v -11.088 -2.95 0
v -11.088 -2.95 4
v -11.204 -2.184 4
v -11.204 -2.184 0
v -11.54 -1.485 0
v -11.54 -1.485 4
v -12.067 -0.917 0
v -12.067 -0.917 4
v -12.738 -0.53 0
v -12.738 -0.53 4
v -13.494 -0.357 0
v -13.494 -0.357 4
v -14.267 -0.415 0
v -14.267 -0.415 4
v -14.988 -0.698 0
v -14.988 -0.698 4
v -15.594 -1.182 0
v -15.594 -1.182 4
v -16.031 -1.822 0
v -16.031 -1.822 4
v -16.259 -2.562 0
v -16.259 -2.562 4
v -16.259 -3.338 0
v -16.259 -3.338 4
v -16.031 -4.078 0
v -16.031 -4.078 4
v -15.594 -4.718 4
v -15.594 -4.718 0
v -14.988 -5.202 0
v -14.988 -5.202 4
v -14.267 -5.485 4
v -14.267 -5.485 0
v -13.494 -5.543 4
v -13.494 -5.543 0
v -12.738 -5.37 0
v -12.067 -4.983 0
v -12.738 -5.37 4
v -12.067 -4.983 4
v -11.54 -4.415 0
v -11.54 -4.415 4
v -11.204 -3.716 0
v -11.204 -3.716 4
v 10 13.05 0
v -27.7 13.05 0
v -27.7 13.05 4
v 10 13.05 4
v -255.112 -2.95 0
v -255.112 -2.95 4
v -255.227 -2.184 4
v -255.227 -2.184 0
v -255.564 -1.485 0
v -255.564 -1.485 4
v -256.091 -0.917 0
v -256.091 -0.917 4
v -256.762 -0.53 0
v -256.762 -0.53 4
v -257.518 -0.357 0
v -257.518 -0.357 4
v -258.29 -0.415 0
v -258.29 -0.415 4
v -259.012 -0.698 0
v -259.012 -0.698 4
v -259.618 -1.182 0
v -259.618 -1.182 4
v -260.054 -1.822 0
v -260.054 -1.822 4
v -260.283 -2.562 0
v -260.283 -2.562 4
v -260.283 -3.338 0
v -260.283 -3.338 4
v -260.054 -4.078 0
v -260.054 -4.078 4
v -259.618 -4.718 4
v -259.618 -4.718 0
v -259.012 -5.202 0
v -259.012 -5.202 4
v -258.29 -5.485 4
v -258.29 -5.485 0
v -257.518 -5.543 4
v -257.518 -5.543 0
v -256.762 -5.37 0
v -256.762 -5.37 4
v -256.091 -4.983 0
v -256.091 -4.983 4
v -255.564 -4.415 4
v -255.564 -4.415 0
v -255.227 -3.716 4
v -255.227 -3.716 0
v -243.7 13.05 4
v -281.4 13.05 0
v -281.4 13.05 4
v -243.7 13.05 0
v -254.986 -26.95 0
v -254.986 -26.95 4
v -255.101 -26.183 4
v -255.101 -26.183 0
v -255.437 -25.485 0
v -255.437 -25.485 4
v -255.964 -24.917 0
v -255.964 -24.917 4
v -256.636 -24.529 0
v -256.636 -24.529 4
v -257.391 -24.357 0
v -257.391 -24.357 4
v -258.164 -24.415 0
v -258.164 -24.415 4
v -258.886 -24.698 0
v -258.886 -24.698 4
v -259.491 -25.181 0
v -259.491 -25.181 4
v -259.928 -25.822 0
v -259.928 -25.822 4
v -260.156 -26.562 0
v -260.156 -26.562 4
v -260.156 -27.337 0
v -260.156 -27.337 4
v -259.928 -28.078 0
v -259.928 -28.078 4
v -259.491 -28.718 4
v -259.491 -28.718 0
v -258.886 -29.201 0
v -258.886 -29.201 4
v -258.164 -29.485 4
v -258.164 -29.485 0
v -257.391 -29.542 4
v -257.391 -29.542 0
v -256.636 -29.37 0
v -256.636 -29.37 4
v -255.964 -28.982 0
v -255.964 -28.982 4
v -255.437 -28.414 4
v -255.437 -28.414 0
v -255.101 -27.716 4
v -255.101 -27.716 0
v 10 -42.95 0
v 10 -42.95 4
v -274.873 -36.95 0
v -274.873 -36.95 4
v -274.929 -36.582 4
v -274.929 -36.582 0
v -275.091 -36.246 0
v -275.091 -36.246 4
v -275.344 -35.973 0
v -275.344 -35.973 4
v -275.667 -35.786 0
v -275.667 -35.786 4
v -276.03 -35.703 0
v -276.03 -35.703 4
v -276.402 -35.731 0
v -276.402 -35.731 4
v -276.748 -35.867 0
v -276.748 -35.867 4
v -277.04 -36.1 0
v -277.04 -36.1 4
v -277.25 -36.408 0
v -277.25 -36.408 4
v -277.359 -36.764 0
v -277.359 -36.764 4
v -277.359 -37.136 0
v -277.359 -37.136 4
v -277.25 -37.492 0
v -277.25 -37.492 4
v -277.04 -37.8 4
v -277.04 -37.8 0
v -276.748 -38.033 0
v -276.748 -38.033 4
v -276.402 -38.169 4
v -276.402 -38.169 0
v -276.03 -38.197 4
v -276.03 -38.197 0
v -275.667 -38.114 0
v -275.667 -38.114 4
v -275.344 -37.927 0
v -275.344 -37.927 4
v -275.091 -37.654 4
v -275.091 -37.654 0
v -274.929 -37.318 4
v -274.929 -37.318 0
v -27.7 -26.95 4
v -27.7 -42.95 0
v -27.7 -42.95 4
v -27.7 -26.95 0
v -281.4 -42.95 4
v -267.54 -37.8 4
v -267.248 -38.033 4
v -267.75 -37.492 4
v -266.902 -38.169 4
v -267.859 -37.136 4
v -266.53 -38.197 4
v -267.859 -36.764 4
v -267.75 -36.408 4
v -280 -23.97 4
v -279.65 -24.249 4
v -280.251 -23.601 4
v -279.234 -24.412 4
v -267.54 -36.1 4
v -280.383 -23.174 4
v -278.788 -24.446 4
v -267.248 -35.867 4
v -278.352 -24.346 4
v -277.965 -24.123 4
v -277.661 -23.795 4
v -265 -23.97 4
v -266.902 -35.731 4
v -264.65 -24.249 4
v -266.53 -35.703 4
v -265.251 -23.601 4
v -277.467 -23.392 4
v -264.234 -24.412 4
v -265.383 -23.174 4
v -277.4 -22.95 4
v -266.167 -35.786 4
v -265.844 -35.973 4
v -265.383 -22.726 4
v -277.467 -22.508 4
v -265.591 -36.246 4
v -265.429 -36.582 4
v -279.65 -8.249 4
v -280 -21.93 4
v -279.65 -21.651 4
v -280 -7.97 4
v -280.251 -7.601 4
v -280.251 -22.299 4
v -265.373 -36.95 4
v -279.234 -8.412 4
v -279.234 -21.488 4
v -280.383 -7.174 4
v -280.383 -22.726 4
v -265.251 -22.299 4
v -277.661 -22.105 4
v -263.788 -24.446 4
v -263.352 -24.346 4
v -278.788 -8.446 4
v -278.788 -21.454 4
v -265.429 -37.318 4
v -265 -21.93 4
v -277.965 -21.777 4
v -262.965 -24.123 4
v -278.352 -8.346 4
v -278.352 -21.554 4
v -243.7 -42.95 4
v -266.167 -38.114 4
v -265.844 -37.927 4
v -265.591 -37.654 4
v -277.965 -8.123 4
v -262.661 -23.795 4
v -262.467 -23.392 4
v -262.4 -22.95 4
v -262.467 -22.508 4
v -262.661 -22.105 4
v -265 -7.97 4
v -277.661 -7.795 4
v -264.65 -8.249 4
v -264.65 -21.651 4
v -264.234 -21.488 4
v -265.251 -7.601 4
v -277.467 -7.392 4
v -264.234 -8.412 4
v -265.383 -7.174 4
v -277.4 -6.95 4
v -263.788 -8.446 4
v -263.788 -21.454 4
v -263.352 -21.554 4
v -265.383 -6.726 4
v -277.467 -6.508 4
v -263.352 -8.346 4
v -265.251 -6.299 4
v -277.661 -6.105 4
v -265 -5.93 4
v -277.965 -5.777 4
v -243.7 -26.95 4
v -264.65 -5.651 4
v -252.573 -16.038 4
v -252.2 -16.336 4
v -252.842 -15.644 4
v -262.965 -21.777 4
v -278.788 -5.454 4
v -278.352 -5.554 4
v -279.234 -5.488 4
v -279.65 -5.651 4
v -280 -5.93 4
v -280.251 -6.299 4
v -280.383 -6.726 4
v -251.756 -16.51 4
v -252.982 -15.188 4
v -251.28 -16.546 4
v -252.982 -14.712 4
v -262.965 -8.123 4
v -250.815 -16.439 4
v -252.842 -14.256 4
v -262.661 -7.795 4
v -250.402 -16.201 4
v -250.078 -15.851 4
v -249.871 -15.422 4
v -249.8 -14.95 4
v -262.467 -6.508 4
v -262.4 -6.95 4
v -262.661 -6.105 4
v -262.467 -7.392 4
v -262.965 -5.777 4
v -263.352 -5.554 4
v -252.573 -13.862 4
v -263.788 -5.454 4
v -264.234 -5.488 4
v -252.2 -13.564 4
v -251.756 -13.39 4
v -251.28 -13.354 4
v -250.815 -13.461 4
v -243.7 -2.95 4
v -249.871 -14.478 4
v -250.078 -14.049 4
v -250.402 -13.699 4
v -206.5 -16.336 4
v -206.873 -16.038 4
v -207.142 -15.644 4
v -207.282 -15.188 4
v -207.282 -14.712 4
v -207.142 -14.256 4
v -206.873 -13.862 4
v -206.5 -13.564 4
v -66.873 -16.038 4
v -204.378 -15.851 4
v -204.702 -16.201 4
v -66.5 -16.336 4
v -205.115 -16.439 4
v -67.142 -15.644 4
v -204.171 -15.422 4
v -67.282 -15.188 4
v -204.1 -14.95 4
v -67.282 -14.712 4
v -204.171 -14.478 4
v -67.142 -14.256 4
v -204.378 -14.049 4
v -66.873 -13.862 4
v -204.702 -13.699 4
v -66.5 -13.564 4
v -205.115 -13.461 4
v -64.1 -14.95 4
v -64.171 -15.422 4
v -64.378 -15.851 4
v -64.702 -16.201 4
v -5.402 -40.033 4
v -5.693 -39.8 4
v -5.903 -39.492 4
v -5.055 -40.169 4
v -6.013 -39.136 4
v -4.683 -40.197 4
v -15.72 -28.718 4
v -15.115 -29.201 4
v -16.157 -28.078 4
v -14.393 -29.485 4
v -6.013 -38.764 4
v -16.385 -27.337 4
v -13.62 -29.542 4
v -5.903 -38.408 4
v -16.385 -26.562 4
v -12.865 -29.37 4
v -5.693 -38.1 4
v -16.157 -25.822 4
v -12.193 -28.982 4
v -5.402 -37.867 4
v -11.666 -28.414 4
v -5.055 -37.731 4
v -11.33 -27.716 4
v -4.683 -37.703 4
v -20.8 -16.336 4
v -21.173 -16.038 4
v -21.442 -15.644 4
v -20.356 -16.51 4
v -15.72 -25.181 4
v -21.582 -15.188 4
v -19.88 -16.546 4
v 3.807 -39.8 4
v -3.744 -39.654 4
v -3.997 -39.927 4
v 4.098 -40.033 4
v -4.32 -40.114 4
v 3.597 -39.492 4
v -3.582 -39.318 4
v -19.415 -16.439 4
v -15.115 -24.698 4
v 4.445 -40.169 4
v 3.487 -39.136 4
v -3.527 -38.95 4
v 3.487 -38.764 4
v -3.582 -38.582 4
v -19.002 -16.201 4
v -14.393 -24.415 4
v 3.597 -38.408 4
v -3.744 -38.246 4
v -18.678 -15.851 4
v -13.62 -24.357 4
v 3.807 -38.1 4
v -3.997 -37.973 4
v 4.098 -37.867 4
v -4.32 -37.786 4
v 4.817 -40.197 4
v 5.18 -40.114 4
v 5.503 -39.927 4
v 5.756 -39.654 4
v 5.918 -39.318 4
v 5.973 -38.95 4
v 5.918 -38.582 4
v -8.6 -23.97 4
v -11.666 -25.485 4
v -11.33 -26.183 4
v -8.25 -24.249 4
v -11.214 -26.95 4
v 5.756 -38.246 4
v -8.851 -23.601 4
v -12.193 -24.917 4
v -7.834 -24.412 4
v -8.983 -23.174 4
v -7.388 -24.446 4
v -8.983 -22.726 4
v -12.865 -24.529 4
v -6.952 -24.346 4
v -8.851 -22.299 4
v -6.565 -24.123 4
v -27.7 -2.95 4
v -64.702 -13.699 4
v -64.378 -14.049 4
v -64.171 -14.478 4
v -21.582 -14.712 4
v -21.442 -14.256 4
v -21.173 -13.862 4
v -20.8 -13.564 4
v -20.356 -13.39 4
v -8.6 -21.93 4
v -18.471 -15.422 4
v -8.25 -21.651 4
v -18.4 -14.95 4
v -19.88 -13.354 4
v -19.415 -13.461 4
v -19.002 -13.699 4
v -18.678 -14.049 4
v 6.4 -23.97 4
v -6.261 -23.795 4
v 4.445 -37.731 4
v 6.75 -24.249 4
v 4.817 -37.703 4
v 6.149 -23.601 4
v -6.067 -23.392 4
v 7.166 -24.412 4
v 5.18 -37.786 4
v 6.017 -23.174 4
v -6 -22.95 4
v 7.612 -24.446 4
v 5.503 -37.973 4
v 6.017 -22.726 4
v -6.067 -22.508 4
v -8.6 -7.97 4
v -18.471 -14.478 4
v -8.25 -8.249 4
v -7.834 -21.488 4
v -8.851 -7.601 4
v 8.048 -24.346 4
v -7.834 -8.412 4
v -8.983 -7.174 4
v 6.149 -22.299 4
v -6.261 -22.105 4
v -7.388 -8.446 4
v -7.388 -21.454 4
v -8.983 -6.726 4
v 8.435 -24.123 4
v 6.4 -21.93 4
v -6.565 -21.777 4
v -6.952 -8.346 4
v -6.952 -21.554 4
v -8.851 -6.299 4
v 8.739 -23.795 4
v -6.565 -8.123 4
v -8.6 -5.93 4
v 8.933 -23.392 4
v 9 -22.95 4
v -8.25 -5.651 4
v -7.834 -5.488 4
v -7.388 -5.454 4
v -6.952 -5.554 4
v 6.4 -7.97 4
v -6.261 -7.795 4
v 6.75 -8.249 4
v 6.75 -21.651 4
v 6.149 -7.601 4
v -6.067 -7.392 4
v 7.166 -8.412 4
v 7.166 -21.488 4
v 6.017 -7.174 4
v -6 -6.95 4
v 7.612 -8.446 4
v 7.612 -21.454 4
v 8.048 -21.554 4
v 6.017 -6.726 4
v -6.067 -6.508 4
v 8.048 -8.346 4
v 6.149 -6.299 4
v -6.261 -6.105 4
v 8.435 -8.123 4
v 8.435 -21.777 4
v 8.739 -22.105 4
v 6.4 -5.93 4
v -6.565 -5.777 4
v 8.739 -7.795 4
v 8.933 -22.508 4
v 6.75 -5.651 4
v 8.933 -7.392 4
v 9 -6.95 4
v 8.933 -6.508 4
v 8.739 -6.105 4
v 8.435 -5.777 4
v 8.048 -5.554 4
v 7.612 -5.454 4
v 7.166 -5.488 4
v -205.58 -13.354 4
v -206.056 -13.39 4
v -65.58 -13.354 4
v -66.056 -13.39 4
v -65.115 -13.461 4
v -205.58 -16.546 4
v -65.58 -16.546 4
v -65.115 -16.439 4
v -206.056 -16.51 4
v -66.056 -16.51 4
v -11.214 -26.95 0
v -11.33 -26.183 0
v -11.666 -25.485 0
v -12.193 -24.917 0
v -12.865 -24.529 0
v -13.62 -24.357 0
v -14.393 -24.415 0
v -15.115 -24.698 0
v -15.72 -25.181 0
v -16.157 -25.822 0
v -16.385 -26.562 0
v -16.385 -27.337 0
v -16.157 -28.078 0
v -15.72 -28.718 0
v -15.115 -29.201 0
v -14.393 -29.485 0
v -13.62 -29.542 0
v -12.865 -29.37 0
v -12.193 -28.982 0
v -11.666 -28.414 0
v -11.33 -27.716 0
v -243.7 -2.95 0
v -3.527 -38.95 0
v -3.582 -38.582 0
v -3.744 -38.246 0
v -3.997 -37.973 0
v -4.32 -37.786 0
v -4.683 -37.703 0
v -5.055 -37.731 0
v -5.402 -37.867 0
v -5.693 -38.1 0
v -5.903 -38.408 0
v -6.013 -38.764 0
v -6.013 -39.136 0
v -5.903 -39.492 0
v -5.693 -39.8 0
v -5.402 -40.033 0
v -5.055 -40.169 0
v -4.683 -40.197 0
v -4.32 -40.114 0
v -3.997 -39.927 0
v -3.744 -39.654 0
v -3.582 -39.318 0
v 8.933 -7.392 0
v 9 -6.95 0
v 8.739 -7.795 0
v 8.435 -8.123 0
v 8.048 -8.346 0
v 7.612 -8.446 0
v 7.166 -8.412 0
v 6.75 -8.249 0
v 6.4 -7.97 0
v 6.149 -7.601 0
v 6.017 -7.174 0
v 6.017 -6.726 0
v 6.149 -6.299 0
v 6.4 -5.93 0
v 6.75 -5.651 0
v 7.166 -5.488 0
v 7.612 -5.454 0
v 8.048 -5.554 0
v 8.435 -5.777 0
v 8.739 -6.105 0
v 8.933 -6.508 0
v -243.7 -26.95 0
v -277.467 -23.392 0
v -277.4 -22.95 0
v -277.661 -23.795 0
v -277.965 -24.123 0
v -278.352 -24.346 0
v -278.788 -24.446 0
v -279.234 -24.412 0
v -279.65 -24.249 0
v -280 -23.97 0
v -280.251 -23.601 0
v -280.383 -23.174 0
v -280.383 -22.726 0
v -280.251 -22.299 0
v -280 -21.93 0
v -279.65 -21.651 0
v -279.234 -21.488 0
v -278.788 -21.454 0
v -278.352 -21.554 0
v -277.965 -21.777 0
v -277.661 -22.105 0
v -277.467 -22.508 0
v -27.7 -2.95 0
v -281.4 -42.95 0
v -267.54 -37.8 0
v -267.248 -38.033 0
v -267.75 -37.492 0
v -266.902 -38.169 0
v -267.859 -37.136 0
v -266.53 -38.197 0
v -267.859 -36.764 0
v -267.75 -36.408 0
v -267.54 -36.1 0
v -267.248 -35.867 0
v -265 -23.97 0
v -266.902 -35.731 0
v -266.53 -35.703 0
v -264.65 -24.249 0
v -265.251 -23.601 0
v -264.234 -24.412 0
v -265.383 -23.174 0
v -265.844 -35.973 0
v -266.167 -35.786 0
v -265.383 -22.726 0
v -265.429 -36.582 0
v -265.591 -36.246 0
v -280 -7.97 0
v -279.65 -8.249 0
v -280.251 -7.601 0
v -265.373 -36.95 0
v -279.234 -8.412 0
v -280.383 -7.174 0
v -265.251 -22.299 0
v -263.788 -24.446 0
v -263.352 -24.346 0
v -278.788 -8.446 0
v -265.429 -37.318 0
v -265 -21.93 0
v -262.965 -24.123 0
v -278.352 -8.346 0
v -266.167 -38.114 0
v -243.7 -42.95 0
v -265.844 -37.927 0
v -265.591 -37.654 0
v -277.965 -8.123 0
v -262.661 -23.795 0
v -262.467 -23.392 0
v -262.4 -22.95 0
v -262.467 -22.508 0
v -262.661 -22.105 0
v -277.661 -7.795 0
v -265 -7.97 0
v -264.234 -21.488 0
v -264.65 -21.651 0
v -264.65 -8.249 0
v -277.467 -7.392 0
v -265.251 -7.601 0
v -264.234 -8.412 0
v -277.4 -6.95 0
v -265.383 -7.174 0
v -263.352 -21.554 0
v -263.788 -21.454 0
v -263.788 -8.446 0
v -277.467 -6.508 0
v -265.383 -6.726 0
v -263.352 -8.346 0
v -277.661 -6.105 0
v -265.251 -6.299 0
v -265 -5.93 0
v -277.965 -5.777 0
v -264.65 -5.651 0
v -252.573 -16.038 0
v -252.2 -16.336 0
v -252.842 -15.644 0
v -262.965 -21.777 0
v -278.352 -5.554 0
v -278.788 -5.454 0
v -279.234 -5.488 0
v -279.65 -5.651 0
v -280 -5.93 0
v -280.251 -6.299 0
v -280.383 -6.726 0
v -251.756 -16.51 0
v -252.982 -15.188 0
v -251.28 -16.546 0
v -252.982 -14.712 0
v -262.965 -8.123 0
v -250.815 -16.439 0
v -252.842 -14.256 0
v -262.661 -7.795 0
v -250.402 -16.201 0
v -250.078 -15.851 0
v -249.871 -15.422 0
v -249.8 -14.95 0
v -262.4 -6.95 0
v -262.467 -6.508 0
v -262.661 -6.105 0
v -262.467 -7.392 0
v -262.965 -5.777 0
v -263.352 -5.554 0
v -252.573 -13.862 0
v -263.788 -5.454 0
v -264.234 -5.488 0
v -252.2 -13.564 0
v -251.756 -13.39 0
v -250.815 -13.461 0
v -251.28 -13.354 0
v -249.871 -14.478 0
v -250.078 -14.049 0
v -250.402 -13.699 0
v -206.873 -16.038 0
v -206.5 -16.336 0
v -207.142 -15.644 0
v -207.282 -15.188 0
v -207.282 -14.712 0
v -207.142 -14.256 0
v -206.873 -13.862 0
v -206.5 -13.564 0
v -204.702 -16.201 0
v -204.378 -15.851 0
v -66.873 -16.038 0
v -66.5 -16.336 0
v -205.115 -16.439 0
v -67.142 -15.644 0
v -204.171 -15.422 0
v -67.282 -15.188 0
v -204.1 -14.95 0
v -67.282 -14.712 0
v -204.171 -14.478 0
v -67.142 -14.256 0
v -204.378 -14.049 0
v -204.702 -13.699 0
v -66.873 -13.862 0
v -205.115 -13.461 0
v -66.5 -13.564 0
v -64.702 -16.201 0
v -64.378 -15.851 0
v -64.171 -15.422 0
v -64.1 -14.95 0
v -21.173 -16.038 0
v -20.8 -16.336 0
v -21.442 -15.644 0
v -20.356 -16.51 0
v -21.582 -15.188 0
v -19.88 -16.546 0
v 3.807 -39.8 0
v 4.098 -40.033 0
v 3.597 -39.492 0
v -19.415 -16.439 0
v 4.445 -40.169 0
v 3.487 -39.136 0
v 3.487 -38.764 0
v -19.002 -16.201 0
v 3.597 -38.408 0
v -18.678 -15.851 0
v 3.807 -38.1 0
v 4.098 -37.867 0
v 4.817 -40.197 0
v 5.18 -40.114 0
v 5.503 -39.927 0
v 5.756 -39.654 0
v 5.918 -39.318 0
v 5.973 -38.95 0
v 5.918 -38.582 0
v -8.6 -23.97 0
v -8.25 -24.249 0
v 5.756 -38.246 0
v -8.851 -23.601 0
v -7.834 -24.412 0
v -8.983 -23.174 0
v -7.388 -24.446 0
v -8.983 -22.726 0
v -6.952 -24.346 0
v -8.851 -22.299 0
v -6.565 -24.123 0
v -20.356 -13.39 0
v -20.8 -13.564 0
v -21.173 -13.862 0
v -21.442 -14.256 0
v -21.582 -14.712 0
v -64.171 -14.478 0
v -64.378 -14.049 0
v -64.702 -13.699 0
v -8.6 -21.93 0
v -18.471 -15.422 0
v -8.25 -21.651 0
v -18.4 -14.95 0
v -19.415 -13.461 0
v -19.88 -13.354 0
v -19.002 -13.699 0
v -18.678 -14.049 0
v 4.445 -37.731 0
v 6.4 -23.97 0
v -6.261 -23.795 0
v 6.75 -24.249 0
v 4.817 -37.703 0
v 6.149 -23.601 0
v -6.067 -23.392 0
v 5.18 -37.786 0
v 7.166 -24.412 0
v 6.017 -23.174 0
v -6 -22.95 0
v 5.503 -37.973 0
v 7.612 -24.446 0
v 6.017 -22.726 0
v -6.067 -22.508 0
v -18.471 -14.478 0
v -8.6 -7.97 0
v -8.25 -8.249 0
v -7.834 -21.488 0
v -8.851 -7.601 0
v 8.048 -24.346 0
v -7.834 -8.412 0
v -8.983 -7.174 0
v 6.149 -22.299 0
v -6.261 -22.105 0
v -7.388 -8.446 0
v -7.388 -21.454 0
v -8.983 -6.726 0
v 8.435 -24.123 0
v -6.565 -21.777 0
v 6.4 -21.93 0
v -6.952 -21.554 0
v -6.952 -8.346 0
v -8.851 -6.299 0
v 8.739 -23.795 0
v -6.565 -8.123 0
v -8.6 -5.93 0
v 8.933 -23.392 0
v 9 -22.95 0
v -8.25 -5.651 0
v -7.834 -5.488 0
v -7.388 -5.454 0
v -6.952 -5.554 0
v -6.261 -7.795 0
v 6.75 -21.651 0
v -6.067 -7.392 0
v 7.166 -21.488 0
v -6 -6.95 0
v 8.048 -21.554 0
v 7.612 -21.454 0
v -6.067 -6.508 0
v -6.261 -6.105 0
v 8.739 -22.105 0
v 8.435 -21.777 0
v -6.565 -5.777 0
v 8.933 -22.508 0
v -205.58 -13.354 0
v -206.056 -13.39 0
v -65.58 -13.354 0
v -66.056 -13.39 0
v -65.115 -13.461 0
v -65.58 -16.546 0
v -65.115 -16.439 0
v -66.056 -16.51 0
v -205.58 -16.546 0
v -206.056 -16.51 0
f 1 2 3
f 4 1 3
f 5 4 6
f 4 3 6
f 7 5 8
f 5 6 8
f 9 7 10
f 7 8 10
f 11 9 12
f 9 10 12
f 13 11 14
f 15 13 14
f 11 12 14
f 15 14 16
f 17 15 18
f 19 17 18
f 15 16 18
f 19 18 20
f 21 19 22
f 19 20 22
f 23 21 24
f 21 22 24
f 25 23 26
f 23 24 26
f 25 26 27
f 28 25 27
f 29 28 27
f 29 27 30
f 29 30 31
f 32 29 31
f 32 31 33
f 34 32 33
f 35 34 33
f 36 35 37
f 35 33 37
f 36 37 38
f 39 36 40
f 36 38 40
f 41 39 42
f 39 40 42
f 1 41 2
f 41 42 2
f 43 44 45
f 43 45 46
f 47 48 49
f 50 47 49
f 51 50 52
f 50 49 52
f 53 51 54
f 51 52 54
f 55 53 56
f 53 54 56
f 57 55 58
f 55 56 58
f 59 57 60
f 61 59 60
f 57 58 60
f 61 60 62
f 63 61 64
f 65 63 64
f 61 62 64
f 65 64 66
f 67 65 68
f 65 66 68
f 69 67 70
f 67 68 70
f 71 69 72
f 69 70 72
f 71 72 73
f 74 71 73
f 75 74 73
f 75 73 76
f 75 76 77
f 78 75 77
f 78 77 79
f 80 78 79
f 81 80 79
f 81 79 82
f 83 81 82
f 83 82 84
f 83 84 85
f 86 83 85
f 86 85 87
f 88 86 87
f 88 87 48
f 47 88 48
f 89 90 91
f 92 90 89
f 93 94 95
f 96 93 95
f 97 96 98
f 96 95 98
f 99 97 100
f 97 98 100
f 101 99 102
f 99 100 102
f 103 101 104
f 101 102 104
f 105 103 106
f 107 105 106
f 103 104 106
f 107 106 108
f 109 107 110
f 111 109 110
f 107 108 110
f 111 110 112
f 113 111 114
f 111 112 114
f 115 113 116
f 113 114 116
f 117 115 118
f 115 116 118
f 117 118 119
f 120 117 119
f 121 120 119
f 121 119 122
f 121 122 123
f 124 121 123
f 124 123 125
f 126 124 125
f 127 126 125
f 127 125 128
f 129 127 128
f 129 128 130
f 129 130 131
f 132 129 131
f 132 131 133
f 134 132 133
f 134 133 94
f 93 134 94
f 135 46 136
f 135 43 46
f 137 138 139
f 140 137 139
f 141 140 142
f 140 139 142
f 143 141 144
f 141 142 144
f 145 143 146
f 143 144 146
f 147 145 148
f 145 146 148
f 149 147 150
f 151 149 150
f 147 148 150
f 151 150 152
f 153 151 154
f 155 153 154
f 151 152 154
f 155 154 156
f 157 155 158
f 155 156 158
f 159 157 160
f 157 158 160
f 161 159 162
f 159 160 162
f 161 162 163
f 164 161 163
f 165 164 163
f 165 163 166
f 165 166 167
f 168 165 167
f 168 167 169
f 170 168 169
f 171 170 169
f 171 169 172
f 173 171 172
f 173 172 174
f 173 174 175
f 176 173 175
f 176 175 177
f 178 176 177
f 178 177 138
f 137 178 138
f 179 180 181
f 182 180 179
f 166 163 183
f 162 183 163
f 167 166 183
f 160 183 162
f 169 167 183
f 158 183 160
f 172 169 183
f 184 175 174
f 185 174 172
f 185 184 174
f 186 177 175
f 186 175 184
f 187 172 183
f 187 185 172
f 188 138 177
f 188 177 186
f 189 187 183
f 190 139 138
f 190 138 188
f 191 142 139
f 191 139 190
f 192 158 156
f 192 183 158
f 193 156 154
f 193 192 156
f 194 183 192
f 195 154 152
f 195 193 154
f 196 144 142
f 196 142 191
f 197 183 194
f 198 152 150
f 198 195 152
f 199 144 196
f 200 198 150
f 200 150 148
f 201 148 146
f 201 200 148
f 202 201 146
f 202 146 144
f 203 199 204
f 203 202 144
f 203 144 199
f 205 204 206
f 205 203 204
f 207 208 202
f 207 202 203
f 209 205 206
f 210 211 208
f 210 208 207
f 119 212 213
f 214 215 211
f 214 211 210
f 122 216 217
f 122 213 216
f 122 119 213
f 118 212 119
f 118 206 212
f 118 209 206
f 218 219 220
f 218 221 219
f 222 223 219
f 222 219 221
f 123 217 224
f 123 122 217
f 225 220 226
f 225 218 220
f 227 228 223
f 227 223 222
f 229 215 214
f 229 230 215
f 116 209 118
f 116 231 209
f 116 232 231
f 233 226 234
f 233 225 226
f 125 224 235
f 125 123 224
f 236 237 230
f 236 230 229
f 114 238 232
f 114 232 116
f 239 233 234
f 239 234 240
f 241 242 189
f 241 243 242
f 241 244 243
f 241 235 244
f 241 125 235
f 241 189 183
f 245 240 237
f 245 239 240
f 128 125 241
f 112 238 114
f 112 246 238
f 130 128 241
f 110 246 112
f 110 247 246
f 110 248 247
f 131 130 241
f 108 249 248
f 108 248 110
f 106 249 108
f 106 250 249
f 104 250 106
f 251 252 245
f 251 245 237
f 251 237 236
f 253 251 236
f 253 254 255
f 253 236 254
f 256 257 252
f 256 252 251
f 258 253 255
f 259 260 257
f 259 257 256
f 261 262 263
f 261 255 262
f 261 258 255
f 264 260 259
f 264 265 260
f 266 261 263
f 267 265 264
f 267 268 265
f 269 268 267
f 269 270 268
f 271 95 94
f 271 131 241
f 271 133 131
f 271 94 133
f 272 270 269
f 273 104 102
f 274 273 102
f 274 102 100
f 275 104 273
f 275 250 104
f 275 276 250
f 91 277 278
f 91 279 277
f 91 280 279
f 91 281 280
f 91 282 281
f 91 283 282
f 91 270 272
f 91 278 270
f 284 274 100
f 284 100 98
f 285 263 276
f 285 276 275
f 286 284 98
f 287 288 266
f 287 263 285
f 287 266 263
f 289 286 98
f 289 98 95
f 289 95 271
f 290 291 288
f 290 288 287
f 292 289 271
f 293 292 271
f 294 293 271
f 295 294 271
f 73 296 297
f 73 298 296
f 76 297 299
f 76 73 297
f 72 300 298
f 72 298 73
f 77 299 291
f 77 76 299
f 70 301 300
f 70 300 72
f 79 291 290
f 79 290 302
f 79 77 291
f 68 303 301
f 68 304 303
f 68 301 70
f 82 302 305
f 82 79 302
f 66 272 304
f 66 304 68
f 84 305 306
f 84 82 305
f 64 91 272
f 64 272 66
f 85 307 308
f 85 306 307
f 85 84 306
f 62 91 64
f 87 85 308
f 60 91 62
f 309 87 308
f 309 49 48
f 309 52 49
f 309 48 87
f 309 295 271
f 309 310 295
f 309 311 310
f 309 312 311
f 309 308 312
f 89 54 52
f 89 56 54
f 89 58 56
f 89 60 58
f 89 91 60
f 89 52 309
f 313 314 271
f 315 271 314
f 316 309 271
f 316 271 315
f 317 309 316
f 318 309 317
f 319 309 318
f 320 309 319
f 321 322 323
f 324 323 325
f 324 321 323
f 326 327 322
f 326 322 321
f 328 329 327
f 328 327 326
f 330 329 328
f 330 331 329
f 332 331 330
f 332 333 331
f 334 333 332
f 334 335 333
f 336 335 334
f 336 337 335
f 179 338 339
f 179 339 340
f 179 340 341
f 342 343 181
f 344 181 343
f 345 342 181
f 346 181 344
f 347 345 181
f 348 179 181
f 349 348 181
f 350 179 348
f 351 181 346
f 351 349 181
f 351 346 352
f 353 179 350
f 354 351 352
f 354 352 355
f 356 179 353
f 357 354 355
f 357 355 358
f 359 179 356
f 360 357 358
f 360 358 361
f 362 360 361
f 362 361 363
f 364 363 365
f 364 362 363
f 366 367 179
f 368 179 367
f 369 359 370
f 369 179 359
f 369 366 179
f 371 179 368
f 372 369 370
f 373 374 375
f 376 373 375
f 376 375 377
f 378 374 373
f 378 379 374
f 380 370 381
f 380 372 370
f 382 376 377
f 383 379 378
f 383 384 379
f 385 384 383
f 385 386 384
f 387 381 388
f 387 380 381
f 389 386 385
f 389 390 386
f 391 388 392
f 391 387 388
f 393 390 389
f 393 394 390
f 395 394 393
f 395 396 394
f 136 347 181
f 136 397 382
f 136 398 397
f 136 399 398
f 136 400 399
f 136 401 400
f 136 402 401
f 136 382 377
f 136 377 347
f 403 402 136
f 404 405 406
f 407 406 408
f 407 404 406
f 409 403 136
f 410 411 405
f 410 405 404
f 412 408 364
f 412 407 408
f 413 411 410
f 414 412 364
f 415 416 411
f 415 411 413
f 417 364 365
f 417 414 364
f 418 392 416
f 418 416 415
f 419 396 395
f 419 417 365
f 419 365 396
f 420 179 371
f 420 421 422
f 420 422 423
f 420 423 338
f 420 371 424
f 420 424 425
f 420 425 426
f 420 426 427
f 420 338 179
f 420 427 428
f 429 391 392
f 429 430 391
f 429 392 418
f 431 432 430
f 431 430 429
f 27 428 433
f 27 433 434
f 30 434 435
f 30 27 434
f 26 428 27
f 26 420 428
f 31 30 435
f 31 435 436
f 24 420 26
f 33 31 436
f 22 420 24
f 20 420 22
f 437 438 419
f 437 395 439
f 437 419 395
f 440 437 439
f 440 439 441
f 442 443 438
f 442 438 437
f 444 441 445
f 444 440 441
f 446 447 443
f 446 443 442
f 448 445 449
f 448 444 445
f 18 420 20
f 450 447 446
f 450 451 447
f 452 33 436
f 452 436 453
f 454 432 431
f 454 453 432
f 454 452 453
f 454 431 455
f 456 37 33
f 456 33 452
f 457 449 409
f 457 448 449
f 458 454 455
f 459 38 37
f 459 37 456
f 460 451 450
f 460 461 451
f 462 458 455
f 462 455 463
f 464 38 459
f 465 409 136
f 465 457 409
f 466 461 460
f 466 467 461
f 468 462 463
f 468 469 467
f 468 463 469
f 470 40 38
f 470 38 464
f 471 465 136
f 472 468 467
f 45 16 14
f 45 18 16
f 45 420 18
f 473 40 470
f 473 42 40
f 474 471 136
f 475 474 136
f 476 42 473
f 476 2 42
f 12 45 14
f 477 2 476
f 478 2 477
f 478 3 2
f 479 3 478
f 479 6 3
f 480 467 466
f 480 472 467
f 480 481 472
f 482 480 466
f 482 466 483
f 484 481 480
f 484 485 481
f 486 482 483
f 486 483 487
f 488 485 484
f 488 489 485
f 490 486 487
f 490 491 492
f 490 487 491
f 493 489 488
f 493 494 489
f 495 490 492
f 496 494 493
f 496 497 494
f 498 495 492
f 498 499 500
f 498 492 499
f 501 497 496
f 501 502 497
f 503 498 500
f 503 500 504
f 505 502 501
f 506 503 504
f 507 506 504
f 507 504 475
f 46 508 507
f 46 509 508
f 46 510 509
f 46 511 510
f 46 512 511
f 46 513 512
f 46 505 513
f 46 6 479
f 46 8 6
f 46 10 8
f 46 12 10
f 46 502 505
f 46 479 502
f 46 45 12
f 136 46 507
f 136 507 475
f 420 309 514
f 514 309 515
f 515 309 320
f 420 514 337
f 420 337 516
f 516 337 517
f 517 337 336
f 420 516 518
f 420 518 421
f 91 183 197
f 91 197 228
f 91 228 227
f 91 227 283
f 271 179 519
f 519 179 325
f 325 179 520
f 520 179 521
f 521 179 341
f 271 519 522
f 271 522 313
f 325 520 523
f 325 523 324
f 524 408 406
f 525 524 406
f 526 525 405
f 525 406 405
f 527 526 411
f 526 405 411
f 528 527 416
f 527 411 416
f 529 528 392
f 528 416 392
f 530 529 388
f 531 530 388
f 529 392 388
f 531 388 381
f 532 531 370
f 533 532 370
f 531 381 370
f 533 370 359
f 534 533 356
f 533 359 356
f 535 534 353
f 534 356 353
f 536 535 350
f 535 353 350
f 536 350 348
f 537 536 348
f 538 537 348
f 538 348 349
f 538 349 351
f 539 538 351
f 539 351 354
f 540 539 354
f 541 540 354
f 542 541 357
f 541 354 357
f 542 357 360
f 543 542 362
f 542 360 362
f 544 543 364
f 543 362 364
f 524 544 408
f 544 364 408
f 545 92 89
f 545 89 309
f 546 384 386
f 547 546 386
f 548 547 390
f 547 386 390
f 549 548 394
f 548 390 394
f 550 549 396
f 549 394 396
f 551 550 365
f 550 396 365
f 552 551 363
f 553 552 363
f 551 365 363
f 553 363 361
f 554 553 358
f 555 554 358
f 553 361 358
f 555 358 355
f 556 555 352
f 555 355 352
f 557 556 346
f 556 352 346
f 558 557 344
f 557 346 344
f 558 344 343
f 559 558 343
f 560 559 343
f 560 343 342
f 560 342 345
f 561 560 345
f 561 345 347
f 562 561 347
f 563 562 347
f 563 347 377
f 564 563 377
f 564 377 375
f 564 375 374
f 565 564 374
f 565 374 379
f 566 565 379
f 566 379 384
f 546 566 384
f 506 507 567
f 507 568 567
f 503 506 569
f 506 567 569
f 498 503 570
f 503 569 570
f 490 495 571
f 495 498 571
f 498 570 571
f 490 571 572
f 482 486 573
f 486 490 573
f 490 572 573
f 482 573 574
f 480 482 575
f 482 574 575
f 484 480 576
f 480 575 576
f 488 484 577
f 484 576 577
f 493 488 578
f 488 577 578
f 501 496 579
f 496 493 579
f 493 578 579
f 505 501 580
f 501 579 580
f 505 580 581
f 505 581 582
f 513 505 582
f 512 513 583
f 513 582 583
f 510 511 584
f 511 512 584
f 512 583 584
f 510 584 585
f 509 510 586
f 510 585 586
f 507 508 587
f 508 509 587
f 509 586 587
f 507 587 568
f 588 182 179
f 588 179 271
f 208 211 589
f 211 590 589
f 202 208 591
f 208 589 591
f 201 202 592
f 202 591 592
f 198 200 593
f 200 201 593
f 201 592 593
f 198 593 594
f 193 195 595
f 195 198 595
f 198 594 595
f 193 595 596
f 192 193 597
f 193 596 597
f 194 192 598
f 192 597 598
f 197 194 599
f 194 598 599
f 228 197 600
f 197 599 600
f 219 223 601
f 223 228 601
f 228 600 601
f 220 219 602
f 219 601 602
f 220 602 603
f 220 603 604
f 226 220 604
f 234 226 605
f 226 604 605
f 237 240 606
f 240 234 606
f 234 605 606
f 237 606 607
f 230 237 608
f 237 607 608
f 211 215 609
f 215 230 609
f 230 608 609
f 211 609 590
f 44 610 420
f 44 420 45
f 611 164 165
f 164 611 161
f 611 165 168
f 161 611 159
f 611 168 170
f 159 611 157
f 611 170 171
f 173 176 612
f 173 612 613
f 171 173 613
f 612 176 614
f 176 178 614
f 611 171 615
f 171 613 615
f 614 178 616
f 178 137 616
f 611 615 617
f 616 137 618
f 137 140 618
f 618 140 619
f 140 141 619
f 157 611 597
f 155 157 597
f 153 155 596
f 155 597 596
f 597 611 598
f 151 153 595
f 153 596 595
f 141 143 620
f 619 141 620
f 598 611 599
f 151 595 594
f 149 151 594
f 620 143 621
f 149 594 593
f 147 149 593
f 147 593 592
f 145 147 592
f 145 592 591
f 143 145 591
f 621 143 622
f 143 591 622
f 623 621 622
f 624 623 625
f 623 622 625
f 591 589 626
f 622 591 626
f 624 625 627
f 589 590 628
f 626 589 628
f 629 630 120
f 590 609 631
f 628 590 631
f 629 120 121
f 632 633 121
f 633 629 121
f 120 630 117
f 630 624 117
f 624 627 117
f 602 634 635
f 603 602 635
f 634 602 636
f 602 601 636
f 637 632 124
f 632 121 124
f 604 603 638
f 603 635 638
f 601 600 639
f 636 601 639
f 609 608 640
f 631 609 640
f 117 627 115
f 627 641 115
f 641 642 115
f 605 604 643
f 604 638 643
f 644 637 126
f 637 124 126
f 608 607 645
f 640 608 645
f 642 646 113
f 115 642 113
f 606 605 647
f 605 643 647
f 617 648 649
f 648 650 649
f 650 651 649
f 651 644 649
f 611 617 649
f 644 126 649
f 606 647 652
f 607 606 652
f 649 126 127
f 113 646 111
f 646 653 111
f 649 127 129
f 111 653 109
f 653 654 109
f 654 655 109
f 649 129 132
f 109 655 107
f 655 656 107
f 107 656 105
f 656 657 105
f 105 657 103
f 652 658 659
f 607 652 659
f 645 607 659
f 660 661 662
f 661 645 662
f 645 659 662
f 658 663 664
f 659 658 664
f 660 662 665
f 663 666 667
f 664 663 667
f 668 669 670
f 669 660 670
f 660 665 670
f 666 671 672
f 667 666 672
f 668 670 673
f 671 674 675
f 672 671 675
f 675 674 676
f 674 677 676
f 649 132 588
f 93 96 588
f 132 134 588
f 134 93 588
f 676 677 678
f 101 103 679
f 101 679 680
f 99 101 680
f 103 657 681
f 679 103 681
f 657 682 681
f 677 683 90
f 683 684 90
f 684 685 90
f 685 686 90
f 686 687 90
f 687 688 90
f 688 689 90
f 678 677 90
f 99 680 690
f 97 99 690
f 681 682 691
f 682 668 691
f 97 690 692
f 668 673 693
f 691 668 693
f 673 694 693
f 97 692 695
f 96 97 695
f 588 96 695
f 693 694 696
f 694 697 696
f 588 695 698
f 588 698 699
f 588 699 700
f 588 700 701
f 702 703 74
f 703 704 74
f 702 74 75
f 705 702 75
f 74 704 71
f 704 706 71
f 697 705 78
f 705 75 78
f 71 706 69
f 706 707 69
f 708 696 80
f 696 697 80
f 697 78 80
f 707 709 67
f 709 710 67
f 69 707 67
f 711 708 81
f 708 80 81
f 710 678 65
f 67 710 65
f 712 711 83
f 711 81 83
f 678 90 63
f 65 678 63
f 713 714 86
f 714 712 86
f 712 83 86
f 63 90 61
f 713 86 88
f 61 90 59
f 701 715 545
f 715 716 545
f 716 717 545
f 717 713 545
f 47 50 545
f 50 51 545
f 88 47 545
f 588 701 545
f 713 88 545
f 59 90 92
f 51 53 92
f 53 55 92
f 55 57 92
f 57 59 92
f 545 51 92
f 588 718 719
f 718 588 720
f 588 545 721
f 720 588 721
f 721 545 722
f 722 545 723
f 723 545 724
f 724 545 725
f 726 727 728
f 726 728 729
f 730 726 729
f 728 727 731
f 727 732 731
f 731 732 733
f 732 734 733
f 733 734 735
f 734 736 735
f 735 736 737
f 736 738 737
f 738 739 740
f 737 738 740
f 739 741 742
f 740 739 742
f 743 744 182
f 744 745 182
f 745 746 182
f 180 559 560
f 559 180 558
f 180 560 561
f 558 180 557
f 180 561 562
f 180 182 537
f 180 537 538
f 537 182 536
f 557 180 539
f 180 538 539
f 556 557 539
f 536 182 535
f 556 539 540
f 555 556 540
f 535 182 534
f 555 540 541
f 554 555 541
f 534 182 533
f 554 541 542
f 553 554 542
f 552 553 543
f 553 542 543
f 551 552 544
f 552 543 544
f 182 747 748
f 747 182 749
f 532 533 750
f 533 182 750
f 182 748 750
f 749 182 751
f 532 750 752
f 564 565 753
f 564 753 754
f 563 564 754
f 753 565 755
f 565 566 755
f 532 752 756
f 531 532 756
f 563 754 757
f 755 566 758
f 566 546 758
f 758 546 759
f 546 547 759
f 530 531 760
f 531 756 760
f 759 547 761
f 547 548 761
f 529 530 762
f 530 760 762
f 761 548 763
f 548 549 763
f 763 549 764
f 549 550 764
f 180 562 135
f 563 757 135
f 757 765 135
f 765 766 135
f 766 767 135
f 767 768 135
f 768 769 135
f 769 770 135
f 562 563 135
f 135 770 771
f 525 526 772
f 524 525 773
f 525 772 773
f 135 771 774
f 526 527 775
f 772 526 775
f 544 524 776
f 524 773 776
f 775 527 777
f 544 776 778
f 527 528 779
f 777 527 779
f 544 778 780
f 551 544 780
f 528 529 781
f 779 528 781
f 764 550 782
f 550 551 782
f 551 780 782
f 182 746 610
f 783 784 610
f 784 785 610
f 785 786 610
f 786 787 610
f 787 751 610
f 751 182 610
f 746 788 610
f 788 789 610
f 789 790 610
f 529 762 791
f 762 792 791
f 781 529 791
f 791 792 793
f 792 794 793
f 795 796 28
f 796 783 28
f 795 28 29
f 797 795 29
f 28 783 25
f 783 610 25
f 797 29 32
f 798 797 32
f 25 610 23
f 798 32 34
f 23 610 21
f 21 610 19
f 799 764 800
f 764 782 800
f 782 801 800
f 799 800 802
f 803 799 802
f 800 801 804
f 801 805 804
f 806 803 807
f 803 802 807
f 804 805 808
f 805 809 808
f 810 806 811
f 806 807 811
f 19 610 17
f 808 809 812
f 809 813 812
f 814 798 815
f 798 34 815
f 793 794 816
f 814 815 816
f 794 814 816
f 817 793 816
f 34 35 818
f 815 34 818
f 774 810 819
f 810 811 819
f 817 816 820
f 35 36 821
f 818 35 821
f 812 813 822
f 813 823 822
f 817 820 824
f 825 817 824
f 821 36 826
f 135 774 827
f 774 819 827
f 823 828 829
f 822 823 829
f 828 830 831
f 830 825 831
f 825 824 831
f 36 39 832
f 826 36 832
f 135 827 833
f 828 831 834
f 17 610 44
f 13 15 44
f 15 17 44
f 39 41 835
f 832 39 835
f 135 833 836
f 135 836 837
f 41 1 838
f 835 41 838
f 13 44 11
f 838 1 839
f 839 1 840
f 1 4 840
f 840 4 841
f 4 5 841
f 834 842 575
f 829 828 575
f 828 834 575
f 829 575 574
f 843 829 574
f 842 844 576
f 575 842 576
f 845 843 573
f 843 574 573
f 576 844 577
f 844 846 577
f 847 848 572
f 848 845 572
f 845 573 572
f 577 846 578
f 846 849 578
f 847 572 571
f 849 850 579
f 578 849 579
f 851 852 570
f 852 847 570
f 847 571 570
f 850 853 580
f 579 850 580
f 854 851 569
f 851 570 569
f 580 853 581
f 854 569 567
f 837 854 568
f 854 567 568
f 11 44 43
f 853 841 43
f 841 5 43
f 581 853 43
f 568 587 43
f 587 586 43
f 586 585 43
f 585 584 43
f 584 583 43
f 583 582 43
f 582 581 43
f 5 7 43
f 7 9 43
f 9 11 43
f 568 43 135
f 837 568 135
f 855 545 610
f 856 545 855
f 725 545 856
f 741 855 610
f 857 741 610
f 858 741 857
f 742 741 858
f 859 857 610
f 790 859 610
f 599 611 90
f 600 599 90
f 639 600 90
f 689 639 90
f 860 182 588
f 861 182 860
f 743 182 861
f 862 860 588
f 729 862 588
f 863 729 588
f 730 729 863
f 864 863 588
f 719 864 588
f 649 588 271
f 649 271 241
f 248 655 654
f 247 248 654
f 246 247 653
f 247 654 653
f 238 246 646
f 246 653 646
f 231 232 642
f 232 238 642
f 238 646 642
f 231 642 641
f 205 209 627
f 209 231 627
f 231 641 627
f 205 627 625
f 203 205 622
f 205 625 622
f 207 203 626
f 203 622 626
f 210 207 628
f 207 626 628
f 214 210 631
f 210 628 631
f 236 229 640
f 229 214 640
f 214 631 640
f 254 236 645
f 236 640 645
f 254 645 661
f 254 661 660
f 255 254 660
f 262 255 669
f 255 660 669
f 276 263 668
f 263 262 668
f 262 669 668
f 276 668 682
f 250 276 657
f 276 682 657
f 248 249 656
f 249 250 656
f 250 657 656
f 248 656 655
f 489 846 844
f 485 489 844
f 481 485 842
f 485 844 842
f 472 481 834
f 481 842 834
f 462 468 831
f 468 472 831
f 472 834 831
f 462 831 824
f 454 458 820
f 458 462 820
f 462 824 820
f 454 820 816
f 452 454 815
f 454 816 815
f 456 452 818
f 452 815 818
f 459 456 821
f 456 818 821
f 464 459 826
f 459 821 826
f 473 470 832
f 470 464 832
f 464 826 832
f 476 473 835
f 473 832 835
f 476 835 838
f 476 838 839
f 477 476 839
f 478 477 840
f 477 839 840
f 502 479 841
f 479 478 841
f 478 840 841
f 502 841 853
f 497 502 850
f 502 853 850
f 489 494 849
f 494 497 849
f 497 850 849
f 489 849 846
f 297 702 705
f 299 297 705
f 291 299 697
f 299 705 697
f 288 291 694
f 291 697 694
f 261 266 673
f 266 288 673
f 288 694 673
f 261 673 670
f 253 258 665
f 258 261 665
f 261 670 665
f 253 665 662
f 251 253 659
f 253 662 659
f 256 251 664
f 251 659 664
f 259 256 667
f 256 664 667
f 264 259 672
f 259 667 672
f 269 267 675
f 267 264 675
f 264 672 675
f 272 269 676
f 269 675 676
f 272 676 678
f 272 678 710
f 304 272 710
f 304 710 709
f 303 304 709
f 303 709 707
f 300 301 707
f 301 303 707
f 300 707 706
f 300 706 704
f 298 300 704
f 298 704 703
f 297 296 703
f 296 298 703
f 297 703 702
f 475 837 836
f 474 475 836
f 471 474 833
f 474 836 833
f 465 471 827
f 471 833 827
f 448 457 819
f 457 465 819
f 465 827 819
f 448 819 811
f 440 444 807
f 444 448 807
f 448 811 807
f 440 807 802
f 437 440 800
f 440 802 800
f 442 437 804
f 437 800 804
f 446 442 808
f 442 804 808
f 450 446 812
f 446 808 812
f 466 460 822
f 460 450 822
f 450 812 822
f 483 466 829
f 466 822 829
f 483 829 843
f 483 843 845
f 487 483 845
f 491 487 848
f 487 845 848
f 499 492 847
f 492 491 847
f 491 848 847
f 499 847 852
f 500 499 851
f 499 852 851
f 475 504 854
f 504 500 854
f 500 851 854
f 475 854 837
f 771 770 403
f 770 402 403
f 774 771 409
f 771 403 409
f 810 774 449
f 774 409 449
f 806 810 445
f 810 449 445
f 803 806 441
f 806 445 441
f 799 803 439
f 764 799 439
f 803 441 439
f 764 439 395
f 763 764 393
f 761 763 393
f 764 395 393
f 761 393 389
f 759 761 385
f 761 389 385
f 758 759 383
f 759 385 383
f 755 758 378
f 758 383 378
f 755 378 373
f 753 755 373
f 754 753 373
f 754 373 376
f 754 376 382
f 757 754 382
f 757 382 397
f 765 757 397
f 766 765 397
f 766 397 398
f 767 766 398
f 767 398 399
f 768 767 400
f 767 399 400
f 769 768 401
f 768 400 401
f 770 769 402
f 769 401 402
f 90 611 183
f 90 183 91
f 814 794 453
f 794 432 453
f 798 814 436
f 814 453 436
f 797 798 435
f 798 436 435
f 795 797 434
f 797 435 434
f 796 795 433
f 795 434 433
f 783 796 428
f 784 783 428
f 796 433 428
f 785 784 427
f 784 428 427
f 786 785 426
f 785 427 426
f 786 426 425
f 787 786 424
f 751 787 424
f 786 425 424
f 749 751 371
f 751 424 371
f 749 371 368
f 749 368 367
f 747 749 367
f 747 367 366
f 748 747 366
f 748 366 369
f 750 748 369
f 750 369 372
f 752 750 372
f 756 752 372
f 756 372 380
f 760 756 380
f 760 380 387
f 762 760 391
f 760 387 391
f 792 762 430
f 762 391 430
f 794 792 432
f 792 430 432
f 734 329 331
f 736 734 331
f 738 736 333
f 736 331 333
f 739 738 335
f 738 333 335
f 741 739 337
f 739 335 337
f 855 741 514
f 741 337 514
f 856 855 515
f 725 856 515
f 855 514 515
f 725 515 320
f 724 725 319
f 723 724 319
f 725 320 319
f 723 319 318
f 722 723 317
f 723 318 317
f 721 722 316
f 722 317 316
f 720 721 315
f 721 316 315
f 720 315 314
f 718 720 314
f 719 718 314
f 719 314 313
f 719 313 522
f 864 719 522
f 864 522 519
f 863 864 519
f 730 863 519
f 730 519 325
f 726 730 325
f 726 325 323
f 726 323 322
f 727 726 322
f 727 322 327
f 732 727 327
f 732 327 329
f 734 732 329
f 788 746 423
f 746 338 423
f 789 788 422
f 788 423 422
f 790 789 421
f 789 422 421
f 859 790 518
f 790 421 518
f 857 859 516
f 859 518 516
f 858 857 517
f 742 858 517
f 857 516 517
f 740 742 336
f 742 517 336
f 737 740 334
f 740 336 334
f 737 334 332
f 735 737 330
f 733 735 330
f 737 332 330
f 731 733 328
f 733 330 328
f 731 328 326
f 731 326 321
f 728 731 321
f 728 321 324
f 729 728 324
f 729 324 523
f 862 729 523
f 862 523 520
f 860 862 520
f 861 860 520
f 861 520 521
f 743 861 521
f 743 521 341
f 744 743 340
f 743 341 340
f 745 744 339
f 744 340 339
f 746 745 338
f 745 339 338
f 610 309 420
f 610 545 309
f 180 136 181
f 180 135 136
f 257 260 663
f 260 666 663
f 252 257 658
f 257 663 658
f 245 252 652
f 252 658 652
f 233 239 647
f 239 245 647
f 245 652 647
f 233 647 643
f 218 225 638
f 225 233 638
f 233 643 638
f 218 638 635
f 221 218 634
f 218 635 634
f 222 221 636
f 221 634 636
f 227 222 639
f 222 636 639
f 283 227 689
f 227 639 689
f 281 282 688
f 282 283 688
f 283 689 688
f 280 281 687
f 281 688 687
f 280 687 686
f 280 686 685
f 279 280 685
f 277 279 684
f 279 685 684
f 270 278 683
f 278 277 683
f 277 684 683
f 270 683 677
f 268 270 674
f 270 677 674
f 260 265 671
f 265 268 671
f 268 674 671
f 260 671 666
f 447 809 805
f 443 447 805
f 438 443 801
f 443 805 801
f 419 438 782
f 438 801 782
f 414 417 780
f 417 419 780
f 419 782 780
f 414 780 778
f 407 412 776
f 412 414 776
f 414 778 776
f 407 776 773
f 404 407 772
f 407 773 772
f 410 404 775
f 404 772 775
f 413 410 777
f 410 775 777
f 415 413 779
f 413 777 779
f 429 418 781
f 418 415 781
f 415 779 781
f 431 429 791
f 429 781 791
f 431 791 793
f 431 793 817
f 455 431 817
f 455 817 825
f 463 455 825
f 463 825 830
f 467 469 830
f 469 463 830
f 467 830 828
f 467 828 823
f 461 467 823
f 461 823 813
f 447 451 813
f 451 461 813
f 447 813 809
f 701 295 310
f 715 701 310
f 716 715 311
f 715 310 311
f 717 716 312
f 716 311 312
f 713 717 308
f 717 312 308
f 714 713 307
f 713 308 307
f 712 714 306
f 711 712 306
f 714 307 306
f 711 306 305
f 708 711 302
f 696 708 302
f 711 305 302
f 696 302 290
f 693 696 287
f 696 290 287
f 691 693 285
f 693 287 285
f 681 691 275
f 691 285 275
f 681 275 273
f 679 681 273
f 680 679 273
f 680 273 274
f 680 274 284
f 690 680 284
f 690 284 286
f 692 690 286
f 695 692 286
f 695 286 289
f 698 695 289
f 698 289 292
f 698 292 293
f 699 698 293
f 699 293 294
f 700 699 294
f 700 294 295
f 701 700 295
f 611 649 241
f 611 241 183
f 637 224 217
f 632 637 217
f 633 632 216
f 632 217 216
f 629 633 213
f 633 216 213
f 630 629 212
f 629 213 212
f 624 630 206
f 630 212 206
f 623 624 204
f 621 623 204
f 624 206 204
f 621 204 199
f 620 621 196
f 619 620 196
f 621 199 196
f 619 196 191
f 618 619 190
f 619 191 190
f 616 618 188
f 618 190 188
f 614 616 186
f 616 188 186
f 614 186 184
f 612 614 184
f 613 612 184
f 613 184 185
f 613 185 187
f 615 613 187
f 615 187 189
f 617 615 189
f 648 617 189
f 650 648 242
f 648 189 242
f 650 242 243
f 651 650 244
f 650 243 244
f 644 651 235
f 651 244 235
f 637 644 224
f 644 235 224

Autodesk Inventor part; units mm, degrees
ref_plane "YZ Plane" through (0, 0, 0) normal (1, 0, 0) x (0, 1, 0)
ref_plane "XZ Plane" through (0, 0, 0) normal (0, 1, 0) x (-1, 0, 0)
ref_plane "XY Plane" through (0, 0, 0) normal (0, 0, 1) x (1, 0, 0)
sketch "Эскиз1" plane through (0, 0, 0) normal (0, 0, 1) x (1, 0, 0)
  circle A0 centre (-7.5, -22.95) radius 1.5 projected
  circle A1 centre (7.5, -22.95) radius 1.5 projected
  circle A2 centre (7.5, -6.95) radius 1.5 projected
  circle A3 centre (-7.5, -6.95) radius 1.5 projected
  line L0 (-281.4, 13.05) -> (10, 13.05)
  line L1 (10, 13.05) -> (10, -42.95)
  line L2 (10, -42.95) -> (-281.4, -42.95)
  line L3 (-281.4, -42.95) -> (-281.4, 13.05)
  line L4 (-281.4, 13.05) -> (10, -42.95) construction
  line L5 (10, 13.05) -> (-281.4, -42.95) construction
  line L6 (-135.7, -14.95) -> (-135.7, -42.95) construction
  circle A4 centre (-263.9, -22.95) radius 1.5
  circle A5 centre (-278.9, -22.95) radius 1.5
  circle A6 centre (-278.9, -6.95) radius 1.5
  circle A7 centre (-263.9, -6.95) radius 1.5
  point P0 (0, 0)
  dimension "d5" = 291.4
  dimension "d8" = 2.5
  dimension "d9" = 20
  dimension "d10" = 20
extrude "Выдавливание1" add sketch "Эскиз1" along normal blind 4
sketch "Эскиз3" plane through (0, 0, 4) normal (0, 0, 1) x (1, 0, 0)
  line L0 (-281.4, -42.95) -> (10, -42.95) construction
  line L1 (10, 13.05) -> (-281.4, 13.05) construction
  circle A0 centre (-257.7118, -2.95) radius 2.6
  circle A1 centre (-257.5855, -26.9497) radius 2.6
  line L2 (10, -39.95) -> (-281.4, -39.95) construction
  line L3 (-281.4, 10.05) -> (10, 10.05) construction
  line L4 (-135.7, -39.95) -> (-135.7, 10.05) construction
  circle A2 centre (-13.6882, -2.95) radius 2.6
  circle A3 centre (-13.8145, -26.9497) radius 2.6
  point P0 (0, 0)
extrude "Выдавливание2" cut sketch "Эскиз3" against normal blind 4
sketch "Эскиз4" plane through (0, 0, 0) normal (0, 0, -1) x (-1, 0, 0)
  line L0 (27.7, 29.05) -> (243.7, 29.05)
  line L1 (243.7, 29.05) -> (243.7, -2.95)
  line L2 (243.7, -2.95) -> (27.7, -2.95)
  line L3 (27.7, -2.95) -> (27.7, 29.05)
  line L4 (-10, 13.05) -> (281.4, 13.05) projected
  line L5 (27.7, 29.05) -> (243.7, -2.95) construction
  line L6 (243.7, 29.05) -> (27.7, -2.95) construction
  point P0 (0, 0)
  point P1 (135.7, 13.05)
  point P2 (243.7, 13.05)
  dimension "d13" = 16
  dimension "d14" = 216
extrude "Выдавливание3" cut sketch "Эскиз4" against normal blind 4
ref_plane "РабПлоскость1" through (-281.4, -14.95, 0) normal (0, -1, 0) x (1, 0, 0)
mirror "Зеркальное отражение1" about plane through (-281.4, -14.95, 0) normal (0, -1, 0) of "Выдавливание3"
sketch "Эскиз5" plane through (0, 0, 4) normal (0, 0, 1) x (1, 0, 0)
  circle A0 centre (4.7234, -38.95) radius 1.25
  circle A1 centre (-4.7766, -38.95) radius 1.25
  line L0 (-243.7, -26.95) -> (-27.7, -26.95) projected
  line L1 (-135.7, -26.95) -> (-135.7, -2.95)
  line L2 (-243.7, -2.95) -> (-27.7, -2.95) projected
  circle A2 centre (-276.1234, -36.95) radius 1.25
  circle A3 centre (-266.6234, -36.95) radius 1.25
  line L3 (-27.7, -42.95) -> (10, -42.95) projected
  point P0 (0, 0)
  dimension "d23" = 4
  dimension "d25" = 2.5
  dimension "d26" = 2.5
  dimension "d27" = 4
  dimension "d28" = 9.5
extrude "Выдавливание4" cut sketch "Эскиз5" against normal blind 10
sketch "Эскиз7" plane through (0, 0, 4) normal (0, 0, 1) x (1, 0, 0)
  circle A0 centre (-20, -14.95) radius 1.6
  circle A1 centre (-65.7, -14.95) radius 1.6
  line L0 (-243.7, -2.95) -> (-27.7, -2.95) projected
  line L1 (-135.7, -2.95) -> (-135.7, -16.103)
  circle A2 centre (-251.4, -14.95) radius 1.6
  circle A3 centre (-205.7, -14.95) radius 1.6
  line L2 (10, -42.95) -> (10, 13.05) projected
  line L3 (10, -14.95) -> (-93.8344, -14.95)
  point P0 (0, 0)
  dimension "d29" = 45.7
  dimension "d30" = 3.2
  dimension "d31" = 3.2
  dimension "d32" = 30
extrude "Выдавливание6" cut sketch "Эскиз7" against normal blind 10
properties part number "центр_рейка" material "Древесина (береза)"
